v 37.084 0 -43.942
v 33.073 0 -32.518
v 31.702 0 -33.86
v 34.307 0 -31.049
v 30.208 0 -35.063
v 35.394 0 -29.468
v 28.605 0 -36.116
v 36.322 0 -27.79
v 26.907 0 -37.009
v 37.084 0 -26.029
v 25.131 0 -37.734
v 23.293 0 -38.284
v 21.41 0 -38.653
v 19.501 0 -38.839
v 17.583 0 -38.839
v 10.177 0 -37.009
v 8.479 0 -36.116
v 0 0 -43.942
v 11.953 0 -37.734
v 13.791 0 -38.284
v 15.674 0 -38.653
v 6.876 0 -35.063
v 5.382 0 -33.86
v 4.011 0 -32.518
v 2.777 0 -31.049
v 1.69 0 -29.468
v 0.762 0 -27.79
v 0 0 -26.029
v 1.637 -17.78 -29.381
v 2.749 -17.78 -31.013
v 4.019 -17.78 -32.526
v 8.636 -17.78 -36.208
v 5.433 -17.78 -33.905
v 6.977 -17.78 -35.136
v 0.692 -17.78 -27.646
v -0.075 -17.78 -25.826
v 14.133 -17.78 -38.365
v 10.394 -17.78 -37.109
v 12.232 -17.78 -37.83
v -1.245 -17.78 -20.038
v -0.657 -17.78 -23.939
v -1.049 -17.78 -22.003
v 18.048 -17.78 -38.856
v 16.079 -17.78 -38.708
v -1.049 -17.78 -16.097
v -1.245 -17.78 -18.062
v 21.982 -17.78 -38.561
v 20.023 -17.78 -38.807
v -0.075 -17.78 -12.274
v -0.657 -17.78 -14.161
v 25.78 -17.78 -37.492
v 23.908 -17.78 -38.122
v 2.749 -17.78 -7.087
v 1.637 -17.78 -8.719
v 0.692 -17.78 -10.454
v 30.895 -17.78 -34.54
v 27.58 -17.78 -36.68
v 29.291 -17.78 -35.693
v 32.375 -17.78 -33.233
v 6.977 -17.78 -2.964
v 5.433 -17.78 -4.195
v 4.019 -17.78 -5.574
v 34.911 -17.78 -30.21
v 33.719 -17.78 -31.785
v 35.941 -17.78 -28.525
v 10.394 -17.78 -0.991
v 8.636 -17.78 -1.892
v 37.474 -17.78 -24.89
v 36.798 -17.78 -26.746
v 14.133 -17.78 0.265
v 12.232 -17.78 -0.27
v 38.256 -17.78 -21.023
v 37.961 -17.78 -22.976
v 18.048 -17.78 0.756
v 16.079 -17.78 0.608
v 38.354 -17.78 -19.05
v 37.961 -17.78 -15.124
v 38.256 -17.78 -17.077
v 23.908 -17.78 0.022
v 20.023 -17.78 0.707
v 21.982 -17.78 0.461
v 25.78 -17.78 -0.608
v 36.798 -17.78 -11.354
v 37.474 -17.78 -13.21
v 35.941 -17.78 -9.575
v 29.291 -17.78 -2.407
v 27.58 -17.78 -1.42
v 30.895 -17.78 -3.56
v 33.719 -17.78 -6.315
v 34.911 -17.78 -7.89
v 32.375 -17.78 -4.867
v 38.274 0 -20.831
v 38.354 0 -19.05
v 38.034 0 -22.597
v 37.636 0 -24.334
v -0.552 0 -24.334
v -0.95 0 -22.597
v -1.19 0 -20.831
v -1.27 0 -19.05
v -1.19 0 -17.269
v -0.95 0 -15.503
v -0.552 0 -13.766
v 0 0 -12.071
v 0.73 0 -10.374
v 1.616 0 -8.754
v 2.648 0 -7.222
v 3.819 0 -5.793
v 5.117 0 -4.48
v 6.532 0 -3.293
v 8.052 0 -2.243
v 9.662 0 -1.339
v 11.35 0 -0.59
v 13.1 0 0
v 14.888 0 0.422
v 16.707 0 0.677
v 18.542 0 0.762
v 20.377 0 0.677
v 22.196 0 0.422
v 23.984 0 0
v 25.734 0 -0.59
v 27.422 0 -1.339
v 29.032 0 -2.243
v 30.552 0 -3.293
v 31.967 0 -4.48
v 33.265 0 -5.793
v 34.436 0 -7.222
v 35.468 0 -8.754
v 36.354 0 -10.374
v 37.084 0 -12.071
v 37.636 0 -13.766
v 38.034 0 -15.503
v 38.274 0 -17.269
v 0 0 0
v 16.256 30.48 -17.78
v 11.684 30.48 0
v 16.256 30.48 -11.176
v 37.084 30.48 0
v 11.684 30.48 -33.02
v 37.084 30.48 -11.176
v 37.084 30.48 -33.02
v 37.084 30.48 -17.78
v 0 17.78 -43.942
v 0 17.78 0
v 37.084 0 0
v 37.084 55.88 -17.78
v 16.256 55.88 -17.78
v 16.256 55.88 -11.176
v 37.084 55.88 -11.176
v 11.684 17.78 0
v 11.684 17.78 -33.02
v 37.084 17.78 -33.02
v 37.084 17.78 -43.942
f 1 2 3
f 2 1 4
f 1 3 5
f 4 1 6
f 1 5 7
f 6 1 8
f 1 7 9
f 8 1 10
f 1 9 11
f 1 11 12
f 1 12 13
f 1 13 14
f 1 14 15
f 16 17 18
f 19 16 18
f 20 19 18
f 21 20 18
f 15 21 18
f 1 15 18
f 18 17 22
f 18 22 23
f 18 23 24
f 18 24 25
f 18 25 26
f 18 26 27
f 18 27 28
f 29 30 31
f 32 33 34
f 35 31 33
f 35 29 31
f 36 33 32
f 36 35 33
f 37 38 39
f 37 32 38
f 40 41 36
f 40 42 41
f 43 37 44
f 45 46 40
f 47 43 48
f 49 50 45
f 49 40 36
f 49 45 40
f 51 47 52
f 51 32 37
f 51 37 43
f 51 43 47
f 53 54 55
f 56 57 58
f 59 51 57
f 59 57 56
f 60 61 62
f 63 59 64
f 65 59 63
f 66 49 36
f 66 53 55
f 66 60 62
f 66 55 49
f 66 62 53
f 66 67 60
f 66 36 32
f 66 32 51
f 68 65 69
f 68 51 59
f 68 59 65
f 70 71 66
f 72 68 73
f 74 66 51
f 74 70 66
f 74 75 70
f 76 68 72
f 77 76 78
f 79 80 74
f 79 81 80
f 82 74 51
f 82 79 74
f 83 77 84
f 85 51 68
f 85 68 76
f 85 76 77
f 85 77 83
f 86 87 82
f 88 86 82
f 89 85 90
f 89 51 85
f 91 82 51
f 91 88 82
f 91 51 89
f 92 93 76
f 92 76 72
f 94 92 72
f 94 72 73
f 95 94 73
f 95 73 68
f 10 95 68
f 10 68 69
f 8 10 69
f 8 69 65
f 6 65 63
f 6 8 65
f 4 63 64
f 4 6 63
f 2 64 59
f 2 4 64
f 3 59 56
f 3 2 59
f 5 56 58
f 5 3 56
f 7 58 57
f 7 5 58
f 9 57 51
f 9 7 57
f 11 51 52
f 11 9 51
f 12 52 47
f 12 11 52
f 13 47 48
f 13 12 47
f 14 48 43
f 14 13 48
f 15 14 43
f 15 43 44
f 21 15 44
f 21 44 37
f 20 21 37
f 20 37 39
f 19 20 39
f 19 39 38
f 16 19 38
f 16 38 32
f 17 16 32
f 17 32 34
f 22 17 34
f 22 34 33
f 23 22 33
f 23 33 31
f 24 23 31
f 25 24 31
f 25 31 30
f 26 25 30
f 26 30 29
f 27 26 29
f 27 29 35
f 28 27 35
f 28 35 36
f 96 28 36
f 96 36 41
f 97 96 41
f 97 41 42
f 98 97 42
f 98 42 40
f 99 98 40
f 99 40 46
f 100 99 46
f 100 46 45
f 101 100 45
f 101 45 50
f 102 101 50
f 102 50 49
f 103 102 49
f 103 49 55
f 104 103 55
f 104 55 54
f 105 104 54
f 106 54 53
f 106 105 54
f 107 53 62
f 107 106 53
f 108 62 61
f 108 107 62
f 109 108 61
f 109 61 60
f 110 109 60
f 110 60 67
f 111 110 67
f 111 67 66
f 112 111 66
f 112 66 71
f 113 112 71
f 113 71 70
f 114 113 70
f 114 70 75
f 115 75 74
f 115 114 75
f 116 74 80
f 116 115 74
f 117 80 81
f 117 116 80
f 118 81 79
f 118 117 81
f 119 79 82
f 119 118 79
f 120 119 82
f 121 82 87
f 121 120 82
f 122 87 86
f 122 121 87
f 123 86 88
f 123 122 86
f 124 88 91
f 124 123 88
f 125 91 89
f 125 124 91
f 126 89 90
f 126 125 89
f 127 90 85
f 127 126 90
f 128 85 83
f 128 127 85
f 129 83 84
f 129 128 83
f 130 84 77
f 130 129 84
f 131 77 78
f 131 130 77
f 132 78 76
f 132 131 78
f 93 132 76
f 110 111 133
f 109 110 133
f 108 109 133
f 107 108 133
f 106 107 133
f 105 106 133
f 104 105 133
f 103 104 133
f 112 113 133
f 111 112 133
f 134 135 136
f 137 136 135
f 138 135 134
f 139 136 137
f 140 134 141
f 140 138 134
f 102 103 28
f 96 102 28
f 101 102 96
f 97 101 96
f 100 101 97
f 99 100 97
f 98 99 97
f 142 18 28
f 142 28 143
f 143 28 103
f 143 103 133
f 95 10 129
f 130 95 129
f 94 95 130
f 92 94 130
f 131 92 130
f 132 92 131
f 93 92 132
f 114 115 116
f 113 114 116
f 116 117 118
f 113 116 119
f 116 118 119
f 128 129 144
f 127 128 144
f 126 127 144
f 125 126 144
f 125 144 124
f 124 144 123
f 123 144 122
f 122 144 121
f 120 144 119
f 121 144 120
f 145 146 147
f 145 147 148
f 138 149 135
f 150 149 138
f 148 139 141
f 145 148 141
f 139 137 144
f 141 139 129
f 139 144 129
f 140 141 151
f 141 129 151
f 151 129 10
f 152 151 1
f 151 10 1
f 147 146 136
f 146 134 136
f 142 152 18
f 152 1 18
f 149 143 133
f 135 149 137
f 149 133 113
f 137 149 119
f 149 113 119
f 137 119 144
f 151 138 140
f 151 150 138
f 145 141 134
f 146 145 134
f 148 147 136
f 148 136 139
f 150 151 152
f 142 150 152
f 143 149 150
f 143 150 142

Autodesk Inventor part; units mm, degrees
ref_plane "YZ Plane" through (0, 0, 0) normal (1, 0, 0) x (0, 1, 0)
ref_plane "XZ Plane" through (0, 0, 0) normal (0, 1, 0) x (-1, 0, 0)
ref_plane "XY Plane" through (0, 0, 0) normal (0, 0, 1) x (1, 0, 0)
sketch "Sketch1" plane through (0, 0, 0) normal (0, 1, 0) x (-1, 0, 0)
  line L0 (0, 0) -> (-37.084, 0)
  line L1 (-37.084, 0) -> (-37.084, -43.942)
  line L2 (-37.084, -43.942) -> (0, -43.942)
  line L3 (0, -43.942) -> (0, 0)
  dimension "d0" = 43.942
  dimension "d1" = 37.084
extrude "Extrusion1" add sketch "Sketch1" along normal blind 17.78
sketch "Sketch2" plane through (0, 17.78, 0) normal (0, 1, 0) x (1, 0, 0)
  line L0 (0, 0) -> (37.084, 0) projected
  line L1 (37.084, 0) -> (11.684, 0)
  line L2 (11.684, 0) -> (11.684, 33.02)
  line L3 (11.684, 33.02) -> (37.084, 33.02)
  line L4 (37.084, 33.02) -> (37.084, 0)
  dimension "d4" = 33.02
  dimension "d5" = 25.4
extrude "Extrusion2" add sketch "Sketch2" along normal blind 12.7
sketch "Sketch3" plane through (0, 30.48, 0) normal (0, 1, 0) x (1, 0, 0)
  line L0 (37.084, 0) -> (37.084, 43.942) projected
  line L1 (16.256, 11.176) -> (37.084, 11.176)
  line L2 (37.084, 11.176) -> (37.084, 17.78)
  line L3 (37.084, 17.78) -> (16.256, 17.78)
  line L4 (16.256, 17.78) -> (16.256, 11.176)
  line L5 (11.684, 0) -> (37.084, 0) projected
  point P0 (0, 0)
  dimension "d8" = 17.78
  dimension "d9" = 6.604
  dimension "d10" = 20.828
extrude "Extrusion3" add sketch "Sketch3" along normal blind 25.4
sketch "Sketch4" plane through (0, 0, -43.942) normal (-1, 0, 0) x (0, 0, 1)
  line L0 (7.348, 15.289) -> (38.9211, 15.289) construction
  line L1 (38.9211, 15.289) -> (38.9211, 2.9854) construction
  line L2 (38.9211, 2.9854) -> (7.348, 2.9854) construction
  line L3 (7.348, 2.9854) -> (7.348, 15.289) construction
  point P0 (43.942, 0)
sketch "Sketch5" plane through (0, 0, 0) normal (0, -1, 0) x (1, 0, 0)
  circle A0 centre (18.542, -19.05) radius 19.812
  line L0 (0, 0) -> (37.084, 0) projected
  line L1 (37.084, -43.942) -> (0, -43.942) construction
  line L2 (18.542, -43.942) -> (18.542, 0) construction
  line L3 (11.684, 0) -> (37.084, 0) construction
  dimension "d13" = 39.624
  dimension "d14" = 19.05
extrude "Extrusion4" add sketch "Sketch5" along normal blind 17.78
properties part number "sierr olympic"
